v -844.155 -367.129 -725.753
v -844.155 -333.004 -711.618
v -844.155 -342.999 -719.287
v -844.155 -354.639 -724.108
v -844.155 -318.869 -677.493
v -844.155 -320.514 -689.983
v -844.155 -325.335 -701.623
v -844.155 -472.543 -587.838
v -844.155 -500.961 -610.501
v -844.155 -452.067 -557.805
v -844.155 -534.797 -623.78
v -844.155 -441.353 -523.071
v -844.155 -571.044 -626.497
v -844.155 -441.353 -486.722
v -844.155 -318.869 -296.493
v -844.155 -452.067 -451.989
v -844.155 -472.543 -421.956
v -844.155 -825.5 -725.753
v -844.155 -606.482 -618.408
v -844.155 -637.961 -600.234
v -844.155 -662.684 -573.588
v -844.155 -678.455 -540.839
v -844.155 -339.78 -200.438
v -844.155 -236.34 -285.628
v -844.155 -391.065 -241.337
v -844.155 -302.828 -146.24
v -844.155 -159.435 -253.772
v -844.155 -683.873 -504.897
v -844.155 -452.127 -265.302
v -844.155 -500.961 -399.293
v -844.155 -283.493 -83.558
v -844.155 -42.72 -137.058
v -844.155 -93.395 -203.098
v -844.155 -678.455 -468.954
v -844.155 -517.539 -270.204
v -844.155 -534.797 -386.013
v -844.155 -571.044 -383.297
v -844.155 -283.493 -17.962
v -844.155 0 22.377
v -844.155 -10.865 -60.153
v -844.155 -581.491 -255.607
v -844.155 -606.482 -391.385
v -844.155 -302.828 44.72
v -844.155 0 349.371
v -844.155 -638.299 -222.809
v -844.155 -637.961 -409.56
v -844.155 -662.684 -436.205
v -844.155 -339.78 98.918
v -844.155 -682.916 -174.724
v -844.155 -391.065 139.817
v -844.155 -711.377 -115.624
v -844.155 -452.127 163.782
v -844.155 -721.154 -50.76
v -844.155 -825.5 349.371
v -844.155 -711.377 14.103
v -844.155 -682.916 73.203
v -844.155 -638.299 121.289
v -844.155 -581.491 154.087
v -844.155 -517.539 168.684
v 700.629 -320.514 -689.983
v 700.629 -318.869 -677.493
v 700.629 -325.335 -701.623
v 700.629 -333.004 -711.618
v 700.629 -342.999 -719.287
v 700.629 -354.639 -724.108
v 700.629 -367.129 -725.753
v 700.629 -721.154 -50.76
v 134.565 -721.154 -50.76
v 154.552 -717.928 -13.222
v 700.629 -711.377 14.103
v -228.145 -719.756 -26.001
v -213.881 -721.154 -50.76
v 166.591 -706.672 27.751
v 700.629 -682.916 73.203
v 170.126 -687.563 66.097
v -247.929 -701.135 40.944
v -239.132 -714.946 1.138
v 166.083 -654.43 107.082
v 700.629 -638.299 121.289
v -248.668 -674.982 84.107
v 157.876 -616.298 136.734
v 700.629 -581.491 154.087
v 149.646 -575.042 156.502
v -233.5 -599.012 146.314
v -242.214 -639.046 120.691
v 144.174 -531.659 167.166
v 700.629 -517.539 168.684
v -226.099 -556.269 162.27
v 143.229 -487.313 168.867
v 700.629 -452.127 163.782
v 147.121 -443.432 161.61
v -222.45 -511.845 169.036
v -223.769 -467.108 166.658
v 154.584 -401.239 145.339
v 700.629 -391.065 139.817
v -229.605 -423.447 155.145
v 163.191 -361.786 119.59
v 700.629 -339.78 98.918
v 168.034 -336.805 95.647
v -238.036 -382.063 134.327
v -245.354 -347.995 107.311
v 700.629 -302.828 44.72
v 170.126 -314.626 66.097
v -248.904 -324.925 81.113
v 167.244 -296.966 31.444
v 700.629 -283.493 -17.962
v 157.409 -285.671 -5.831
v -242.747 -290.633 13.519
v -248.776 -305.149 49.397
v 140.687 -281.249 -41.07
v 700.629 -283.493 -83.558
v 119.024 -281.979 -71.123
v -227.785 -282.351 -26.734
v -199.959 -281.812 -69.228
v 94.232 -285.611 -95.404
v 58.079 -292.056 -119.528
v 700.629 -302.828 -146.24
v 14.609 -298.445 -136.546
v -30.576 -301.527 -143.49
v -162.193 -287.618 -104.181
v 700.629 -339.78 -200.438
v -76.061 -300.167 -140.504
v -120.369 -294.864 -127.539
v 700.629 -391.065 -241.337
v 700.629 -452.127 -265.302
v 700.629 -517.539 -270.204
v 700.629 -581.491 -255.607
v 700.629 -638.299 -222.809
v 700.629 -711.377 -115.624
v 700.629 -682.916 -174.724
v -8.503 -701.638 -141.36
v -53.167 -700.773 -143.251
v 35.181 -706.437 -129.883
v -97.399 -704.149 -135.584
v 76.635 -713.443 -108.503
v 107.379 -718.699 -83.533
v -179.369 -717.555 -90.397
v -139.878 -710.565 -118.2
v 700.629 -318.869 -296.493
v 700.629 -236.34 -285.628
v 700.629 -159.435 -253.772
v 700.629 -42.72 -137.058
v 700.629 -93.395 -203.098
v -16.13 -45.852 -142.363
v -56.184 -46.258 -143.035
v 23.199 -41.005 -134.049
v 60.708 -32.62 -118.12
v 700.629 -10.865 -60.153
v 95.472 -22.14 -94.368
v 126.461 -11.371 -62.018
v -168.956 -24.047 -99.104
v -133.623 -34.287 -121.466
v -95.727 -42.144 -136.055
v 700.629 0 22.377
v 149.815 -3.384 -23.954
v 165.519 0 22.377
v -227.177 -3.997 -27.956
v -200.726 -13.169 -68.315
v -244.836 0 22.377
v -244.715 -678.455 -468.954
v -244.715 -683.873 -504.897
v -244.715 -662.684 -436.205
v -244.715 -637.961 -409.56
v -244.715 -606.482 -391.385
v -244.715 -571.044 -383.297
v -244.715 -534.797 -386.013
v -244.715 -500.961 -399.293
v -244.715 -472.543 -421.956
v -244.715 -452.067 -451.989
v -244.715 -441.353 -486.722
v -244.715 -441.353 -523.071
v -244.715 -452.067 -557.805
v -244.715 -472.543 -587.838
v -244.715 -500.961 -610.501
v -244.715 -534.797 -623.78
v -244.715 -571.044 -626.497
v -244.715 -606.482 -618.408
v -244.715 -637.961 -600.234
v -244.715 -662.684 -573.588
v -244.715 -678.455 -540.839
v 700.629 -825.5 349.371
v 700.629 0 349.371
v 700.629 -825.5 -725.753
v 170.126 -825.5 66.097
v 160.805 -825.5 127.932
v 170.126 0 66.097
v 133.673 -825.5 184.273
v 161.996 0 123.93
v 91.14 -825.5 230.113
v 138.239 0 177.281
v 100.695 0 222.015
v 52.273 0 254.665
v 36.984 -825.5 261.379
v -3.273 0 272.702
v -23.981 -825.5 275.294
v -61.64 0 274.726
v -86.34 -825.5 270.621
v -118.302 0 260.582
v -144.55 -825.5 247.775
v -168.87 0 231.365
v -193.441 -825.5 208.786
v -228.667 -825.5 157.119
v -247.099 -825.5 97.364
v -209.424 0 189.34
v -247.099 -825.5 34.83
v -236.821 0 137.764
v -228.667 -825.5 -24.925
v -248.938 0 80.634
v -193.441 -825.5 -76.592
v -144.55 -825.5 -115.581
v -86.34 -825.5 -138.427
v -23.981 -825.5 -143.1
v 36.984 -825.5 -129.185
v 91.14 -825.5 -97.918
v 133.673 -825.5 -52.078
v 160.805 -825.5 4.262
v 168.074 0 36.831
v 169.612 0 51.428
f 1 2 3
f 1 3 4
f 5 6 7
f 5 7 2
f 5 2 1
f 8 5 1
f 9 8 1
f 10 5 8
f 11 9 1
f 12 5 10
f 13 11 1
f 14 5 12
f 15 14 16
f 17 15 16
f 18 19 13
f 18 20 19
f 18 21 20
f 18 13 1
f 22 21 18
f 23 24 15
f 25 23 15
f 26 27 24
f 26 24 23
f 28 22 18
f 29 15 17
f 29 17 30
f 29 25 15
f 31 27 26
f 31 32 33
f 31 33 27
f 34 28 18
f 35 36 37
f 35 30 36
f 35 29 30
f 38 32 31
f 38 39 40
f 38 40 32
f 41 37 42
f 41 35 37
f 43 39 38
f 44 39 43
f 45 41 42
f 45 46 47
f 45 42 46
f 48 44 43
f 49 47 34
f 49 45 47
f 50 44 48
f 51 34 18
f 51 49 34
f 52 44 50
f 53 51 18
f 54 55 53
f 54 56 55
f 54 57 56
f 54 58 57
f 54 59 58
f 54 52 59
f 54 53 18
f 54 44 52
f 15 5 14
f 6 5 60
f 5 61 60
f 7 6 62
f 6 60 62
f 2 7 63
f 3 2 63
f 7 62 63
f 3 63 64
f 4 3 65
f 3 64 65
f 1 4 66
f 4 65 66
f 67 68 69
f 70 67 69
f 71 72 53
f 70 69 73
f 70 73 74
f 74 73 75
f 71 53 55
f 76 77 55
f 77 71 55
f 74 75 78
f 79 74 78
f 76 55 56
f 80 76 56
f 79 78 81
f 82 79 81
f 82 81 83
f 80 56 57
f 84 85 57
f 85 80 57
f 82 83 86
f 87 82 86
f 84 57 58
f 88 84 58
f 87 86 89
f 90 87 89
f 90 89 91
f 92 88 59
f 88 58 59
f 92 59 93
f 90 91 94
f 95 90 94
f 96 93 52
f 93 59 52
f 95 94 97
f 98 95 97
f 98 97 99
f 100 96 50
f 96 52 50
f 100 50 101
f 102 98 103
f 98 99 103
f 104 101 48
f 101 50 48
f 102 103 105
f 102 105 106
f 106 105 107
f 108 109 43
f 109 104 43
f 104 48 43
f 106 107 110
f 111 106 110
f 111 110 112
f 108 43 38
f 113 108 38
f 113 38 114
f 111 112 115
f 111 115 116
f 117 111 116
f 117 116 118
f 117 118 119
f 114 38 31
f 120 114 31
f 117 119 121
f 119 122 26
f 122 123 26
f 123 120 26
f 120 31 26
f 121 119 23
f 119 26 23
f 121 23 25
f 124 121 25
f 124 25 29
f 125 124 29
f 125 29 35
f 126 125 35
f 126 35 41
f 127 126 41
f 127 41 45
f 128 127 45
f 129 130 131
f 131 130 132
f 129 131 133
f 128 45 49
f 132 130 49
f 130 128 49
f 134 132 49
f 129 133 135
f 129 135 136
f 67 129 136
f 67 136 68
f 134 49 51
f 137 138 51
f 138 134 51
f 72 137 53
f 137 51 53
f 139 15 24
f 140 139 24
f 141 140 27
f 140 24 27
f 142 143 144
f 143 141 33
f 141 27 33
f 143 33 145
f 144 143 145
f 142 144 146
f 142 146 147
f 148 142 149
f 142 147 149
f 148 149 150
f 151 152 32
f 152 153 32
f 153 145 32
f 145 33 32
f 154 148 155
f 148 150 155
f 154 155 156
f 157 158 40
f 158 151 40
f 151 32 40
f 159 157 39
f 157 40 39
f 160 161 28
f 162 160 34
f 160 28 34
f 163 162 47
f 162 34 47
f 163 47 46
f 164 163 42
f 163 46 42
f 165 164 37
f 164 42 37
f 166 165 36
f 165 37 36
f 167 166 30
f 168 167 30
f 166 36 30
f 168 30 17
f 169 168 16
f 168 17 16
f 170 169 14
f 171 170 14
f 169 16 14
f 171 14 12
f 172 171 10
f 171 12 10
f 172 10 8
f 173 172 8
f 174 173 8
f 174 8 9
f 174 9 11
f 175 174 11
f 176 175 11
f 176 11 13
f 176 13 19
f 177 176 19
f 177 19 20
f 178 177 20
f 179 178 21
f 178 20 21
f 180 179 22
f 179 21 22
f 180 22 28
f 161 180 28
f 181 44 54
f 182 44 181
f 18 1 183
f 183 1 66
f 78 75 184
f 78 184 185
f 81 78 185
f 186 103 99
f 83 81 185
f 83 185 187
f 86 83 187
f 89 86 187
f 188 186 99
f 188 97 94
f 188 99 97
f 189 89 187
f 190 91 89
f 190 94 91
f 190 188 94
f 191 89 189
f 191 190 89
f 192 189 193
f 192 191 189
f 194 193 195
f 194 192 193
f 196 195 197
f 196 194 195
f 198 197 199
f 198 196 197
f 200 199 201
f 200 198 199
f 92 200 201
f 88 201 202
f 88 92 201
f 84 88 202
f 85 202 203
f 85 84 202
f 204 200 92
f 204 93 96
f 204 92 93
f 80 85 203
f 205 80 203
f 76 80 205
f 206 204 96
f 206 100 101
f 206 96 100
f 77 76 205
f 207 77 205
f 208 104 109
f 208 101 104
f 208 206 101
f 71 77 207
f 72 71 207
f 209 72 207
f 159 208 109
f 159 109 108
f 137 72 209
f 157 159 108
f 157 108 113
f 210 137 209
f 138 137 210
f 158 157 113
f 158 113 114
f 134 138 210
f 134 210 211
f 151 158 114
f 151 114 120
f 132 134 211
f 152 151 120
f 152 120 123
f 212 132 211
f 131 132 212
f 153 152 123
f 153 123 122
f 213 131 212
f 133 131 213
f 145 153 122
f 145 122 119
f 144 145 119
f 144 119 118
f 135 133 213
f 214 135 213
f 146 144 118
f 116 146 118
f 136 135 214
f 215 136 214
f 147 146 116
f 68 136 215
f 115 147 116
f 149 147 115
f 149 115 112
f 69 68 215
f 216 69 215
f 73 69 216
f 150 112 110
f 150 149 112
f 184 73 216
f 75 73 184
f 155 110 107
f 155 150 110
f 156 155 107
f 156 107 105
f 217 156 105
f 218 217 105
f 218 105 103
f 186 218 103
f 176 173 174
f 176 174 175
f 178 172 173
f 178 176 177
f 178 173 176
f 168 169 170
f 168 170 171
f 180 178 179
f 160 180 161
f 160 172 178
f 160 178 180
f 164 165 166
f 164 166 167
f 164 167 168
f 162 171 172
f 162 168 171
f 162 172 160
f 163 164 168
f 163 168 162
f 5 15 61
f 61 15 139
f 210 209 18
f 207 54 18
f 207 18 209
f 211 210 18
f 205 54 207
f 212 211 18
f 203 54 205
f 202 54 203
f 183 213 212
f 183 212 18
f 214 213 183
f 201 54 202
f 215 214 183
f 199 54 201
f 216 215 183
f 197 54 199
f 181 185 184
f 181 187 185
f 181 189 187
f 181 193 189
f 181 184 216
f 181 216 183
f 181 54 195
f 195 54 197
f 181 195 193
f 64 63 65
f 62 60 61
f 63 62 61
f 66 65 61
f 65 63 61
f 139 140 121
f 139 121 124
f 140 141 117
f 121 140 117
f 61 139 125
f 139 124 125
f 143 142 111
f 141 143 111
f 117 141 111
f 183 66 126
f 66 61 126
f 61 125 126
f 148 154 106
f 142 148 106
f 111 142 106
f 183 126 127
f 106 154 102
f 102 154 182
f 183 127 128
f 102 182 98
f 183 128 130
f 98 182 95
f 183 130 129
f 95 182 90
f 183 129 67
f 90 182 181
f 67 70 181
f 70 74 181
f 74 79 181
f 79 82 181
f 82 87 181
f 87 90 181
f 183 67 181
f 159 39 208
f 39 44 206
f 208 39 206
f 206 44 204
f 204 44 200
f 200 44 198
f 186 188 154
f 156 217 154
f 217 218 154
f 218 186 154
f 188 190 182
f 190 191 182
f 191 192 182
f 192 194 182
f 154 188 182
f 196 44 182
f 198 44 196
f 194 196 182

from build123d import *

# Parameters (mm, degrees)
F0_W        = 1544.7841286659
F0_H        = 645.8633244038
F0_R        = 209.7838577095
F1_DEPTH    = 825.5
F2_T1_DEPTH = 3139.1307652571
F3_DEPTH    = 429.26
F4_R        = 220.0590869867
F5_DEPTH    = 1765.3
F6_R        = 48.26
F4_R_2      = 121.9408524026
F7_DEPTH    = 599.44


# Not quite as in the source:
# - a fillet or chamfer that OpenCascade refuses, or shapes differently, is made with other operations: its cross-section is extruded or revolved along the edge and cut away or added


with BuildPart() as f1:
    # F0 (on Front) → F1 (new body)
    with BuildSketch(Plane.XZ):
        with Locations((-71.7625916004, 26.4388471842)):
            Rectangle(F0_W, F0_H)
        with Locations((-39.6583005786, 66.097125411)):
            Circle(F0_R, mode=Mode.SUBTRACT)
    extrude(amount=F1_DEPTH)

    # F2: fillet of radius 318.8693273182 on 1 edges, made by hand

    # F2_s2 → F2_t1 (cut)
    with BuildSketch(Plane.YZ.offset(-1641.327974229)):
        with BuildLine():
            ThreePointArc((-318.8693273182, -296.4928150177), (-93.3946636591, -203.0981513586), (0, 22.3765123005))
            Line((0, 22.3765123005), (0, -296.4928150177))
            Line((0, -296.4928150177), (-318.8693273182, -296.4928150177))
        make_face()
    extrude(amount=F2_T1_DEPTH, mode=Mode.SUBTRACT)

    # F3 (add): a face of the model
    f3_faces = [f1.faces().sort_by_distance(p)[0] for p in [
        (-71.7625916004, -572.1846636591, -296.4928150177),
    ]]
    extrude(f3_faces, amount=F3_DEPTH)

    # F4 (on face) → F5 (cut)
    with BuildSketch(Plane(origin=(-844.1546559334, 0, 0), x_dir=(0, -1, 0), z_dir=(-1, 0, 0))):
        with Locations((501.0944604874, -50.760243088)):
            Circle(F4_R)
    extrude(amount=-F5_DEPTH, mode=Mode.SUBTRACT)

    # F6
    f6_edges = [f1.edges().sort_by_distance(p)[0] for p in [
        (-71.762592, -318.869327, -725.752815),
    ]]
    fillet(f6_edges, radius=F6_R)

    # F4 (on face) → F7 (cut)
    with BuildSketch(Plane(origin=(-844.1546559334, 0, 0), x_dir=(0, -1, 0), z_dir=(-1, 0, 0))):
        with Locations((561.931848526, -504.8967003822)):
            Circle(F4_R_2)
    extrude(amount=-F7_DEPTH, mode=Mode.SUBTRACT)


solid = f1.part
